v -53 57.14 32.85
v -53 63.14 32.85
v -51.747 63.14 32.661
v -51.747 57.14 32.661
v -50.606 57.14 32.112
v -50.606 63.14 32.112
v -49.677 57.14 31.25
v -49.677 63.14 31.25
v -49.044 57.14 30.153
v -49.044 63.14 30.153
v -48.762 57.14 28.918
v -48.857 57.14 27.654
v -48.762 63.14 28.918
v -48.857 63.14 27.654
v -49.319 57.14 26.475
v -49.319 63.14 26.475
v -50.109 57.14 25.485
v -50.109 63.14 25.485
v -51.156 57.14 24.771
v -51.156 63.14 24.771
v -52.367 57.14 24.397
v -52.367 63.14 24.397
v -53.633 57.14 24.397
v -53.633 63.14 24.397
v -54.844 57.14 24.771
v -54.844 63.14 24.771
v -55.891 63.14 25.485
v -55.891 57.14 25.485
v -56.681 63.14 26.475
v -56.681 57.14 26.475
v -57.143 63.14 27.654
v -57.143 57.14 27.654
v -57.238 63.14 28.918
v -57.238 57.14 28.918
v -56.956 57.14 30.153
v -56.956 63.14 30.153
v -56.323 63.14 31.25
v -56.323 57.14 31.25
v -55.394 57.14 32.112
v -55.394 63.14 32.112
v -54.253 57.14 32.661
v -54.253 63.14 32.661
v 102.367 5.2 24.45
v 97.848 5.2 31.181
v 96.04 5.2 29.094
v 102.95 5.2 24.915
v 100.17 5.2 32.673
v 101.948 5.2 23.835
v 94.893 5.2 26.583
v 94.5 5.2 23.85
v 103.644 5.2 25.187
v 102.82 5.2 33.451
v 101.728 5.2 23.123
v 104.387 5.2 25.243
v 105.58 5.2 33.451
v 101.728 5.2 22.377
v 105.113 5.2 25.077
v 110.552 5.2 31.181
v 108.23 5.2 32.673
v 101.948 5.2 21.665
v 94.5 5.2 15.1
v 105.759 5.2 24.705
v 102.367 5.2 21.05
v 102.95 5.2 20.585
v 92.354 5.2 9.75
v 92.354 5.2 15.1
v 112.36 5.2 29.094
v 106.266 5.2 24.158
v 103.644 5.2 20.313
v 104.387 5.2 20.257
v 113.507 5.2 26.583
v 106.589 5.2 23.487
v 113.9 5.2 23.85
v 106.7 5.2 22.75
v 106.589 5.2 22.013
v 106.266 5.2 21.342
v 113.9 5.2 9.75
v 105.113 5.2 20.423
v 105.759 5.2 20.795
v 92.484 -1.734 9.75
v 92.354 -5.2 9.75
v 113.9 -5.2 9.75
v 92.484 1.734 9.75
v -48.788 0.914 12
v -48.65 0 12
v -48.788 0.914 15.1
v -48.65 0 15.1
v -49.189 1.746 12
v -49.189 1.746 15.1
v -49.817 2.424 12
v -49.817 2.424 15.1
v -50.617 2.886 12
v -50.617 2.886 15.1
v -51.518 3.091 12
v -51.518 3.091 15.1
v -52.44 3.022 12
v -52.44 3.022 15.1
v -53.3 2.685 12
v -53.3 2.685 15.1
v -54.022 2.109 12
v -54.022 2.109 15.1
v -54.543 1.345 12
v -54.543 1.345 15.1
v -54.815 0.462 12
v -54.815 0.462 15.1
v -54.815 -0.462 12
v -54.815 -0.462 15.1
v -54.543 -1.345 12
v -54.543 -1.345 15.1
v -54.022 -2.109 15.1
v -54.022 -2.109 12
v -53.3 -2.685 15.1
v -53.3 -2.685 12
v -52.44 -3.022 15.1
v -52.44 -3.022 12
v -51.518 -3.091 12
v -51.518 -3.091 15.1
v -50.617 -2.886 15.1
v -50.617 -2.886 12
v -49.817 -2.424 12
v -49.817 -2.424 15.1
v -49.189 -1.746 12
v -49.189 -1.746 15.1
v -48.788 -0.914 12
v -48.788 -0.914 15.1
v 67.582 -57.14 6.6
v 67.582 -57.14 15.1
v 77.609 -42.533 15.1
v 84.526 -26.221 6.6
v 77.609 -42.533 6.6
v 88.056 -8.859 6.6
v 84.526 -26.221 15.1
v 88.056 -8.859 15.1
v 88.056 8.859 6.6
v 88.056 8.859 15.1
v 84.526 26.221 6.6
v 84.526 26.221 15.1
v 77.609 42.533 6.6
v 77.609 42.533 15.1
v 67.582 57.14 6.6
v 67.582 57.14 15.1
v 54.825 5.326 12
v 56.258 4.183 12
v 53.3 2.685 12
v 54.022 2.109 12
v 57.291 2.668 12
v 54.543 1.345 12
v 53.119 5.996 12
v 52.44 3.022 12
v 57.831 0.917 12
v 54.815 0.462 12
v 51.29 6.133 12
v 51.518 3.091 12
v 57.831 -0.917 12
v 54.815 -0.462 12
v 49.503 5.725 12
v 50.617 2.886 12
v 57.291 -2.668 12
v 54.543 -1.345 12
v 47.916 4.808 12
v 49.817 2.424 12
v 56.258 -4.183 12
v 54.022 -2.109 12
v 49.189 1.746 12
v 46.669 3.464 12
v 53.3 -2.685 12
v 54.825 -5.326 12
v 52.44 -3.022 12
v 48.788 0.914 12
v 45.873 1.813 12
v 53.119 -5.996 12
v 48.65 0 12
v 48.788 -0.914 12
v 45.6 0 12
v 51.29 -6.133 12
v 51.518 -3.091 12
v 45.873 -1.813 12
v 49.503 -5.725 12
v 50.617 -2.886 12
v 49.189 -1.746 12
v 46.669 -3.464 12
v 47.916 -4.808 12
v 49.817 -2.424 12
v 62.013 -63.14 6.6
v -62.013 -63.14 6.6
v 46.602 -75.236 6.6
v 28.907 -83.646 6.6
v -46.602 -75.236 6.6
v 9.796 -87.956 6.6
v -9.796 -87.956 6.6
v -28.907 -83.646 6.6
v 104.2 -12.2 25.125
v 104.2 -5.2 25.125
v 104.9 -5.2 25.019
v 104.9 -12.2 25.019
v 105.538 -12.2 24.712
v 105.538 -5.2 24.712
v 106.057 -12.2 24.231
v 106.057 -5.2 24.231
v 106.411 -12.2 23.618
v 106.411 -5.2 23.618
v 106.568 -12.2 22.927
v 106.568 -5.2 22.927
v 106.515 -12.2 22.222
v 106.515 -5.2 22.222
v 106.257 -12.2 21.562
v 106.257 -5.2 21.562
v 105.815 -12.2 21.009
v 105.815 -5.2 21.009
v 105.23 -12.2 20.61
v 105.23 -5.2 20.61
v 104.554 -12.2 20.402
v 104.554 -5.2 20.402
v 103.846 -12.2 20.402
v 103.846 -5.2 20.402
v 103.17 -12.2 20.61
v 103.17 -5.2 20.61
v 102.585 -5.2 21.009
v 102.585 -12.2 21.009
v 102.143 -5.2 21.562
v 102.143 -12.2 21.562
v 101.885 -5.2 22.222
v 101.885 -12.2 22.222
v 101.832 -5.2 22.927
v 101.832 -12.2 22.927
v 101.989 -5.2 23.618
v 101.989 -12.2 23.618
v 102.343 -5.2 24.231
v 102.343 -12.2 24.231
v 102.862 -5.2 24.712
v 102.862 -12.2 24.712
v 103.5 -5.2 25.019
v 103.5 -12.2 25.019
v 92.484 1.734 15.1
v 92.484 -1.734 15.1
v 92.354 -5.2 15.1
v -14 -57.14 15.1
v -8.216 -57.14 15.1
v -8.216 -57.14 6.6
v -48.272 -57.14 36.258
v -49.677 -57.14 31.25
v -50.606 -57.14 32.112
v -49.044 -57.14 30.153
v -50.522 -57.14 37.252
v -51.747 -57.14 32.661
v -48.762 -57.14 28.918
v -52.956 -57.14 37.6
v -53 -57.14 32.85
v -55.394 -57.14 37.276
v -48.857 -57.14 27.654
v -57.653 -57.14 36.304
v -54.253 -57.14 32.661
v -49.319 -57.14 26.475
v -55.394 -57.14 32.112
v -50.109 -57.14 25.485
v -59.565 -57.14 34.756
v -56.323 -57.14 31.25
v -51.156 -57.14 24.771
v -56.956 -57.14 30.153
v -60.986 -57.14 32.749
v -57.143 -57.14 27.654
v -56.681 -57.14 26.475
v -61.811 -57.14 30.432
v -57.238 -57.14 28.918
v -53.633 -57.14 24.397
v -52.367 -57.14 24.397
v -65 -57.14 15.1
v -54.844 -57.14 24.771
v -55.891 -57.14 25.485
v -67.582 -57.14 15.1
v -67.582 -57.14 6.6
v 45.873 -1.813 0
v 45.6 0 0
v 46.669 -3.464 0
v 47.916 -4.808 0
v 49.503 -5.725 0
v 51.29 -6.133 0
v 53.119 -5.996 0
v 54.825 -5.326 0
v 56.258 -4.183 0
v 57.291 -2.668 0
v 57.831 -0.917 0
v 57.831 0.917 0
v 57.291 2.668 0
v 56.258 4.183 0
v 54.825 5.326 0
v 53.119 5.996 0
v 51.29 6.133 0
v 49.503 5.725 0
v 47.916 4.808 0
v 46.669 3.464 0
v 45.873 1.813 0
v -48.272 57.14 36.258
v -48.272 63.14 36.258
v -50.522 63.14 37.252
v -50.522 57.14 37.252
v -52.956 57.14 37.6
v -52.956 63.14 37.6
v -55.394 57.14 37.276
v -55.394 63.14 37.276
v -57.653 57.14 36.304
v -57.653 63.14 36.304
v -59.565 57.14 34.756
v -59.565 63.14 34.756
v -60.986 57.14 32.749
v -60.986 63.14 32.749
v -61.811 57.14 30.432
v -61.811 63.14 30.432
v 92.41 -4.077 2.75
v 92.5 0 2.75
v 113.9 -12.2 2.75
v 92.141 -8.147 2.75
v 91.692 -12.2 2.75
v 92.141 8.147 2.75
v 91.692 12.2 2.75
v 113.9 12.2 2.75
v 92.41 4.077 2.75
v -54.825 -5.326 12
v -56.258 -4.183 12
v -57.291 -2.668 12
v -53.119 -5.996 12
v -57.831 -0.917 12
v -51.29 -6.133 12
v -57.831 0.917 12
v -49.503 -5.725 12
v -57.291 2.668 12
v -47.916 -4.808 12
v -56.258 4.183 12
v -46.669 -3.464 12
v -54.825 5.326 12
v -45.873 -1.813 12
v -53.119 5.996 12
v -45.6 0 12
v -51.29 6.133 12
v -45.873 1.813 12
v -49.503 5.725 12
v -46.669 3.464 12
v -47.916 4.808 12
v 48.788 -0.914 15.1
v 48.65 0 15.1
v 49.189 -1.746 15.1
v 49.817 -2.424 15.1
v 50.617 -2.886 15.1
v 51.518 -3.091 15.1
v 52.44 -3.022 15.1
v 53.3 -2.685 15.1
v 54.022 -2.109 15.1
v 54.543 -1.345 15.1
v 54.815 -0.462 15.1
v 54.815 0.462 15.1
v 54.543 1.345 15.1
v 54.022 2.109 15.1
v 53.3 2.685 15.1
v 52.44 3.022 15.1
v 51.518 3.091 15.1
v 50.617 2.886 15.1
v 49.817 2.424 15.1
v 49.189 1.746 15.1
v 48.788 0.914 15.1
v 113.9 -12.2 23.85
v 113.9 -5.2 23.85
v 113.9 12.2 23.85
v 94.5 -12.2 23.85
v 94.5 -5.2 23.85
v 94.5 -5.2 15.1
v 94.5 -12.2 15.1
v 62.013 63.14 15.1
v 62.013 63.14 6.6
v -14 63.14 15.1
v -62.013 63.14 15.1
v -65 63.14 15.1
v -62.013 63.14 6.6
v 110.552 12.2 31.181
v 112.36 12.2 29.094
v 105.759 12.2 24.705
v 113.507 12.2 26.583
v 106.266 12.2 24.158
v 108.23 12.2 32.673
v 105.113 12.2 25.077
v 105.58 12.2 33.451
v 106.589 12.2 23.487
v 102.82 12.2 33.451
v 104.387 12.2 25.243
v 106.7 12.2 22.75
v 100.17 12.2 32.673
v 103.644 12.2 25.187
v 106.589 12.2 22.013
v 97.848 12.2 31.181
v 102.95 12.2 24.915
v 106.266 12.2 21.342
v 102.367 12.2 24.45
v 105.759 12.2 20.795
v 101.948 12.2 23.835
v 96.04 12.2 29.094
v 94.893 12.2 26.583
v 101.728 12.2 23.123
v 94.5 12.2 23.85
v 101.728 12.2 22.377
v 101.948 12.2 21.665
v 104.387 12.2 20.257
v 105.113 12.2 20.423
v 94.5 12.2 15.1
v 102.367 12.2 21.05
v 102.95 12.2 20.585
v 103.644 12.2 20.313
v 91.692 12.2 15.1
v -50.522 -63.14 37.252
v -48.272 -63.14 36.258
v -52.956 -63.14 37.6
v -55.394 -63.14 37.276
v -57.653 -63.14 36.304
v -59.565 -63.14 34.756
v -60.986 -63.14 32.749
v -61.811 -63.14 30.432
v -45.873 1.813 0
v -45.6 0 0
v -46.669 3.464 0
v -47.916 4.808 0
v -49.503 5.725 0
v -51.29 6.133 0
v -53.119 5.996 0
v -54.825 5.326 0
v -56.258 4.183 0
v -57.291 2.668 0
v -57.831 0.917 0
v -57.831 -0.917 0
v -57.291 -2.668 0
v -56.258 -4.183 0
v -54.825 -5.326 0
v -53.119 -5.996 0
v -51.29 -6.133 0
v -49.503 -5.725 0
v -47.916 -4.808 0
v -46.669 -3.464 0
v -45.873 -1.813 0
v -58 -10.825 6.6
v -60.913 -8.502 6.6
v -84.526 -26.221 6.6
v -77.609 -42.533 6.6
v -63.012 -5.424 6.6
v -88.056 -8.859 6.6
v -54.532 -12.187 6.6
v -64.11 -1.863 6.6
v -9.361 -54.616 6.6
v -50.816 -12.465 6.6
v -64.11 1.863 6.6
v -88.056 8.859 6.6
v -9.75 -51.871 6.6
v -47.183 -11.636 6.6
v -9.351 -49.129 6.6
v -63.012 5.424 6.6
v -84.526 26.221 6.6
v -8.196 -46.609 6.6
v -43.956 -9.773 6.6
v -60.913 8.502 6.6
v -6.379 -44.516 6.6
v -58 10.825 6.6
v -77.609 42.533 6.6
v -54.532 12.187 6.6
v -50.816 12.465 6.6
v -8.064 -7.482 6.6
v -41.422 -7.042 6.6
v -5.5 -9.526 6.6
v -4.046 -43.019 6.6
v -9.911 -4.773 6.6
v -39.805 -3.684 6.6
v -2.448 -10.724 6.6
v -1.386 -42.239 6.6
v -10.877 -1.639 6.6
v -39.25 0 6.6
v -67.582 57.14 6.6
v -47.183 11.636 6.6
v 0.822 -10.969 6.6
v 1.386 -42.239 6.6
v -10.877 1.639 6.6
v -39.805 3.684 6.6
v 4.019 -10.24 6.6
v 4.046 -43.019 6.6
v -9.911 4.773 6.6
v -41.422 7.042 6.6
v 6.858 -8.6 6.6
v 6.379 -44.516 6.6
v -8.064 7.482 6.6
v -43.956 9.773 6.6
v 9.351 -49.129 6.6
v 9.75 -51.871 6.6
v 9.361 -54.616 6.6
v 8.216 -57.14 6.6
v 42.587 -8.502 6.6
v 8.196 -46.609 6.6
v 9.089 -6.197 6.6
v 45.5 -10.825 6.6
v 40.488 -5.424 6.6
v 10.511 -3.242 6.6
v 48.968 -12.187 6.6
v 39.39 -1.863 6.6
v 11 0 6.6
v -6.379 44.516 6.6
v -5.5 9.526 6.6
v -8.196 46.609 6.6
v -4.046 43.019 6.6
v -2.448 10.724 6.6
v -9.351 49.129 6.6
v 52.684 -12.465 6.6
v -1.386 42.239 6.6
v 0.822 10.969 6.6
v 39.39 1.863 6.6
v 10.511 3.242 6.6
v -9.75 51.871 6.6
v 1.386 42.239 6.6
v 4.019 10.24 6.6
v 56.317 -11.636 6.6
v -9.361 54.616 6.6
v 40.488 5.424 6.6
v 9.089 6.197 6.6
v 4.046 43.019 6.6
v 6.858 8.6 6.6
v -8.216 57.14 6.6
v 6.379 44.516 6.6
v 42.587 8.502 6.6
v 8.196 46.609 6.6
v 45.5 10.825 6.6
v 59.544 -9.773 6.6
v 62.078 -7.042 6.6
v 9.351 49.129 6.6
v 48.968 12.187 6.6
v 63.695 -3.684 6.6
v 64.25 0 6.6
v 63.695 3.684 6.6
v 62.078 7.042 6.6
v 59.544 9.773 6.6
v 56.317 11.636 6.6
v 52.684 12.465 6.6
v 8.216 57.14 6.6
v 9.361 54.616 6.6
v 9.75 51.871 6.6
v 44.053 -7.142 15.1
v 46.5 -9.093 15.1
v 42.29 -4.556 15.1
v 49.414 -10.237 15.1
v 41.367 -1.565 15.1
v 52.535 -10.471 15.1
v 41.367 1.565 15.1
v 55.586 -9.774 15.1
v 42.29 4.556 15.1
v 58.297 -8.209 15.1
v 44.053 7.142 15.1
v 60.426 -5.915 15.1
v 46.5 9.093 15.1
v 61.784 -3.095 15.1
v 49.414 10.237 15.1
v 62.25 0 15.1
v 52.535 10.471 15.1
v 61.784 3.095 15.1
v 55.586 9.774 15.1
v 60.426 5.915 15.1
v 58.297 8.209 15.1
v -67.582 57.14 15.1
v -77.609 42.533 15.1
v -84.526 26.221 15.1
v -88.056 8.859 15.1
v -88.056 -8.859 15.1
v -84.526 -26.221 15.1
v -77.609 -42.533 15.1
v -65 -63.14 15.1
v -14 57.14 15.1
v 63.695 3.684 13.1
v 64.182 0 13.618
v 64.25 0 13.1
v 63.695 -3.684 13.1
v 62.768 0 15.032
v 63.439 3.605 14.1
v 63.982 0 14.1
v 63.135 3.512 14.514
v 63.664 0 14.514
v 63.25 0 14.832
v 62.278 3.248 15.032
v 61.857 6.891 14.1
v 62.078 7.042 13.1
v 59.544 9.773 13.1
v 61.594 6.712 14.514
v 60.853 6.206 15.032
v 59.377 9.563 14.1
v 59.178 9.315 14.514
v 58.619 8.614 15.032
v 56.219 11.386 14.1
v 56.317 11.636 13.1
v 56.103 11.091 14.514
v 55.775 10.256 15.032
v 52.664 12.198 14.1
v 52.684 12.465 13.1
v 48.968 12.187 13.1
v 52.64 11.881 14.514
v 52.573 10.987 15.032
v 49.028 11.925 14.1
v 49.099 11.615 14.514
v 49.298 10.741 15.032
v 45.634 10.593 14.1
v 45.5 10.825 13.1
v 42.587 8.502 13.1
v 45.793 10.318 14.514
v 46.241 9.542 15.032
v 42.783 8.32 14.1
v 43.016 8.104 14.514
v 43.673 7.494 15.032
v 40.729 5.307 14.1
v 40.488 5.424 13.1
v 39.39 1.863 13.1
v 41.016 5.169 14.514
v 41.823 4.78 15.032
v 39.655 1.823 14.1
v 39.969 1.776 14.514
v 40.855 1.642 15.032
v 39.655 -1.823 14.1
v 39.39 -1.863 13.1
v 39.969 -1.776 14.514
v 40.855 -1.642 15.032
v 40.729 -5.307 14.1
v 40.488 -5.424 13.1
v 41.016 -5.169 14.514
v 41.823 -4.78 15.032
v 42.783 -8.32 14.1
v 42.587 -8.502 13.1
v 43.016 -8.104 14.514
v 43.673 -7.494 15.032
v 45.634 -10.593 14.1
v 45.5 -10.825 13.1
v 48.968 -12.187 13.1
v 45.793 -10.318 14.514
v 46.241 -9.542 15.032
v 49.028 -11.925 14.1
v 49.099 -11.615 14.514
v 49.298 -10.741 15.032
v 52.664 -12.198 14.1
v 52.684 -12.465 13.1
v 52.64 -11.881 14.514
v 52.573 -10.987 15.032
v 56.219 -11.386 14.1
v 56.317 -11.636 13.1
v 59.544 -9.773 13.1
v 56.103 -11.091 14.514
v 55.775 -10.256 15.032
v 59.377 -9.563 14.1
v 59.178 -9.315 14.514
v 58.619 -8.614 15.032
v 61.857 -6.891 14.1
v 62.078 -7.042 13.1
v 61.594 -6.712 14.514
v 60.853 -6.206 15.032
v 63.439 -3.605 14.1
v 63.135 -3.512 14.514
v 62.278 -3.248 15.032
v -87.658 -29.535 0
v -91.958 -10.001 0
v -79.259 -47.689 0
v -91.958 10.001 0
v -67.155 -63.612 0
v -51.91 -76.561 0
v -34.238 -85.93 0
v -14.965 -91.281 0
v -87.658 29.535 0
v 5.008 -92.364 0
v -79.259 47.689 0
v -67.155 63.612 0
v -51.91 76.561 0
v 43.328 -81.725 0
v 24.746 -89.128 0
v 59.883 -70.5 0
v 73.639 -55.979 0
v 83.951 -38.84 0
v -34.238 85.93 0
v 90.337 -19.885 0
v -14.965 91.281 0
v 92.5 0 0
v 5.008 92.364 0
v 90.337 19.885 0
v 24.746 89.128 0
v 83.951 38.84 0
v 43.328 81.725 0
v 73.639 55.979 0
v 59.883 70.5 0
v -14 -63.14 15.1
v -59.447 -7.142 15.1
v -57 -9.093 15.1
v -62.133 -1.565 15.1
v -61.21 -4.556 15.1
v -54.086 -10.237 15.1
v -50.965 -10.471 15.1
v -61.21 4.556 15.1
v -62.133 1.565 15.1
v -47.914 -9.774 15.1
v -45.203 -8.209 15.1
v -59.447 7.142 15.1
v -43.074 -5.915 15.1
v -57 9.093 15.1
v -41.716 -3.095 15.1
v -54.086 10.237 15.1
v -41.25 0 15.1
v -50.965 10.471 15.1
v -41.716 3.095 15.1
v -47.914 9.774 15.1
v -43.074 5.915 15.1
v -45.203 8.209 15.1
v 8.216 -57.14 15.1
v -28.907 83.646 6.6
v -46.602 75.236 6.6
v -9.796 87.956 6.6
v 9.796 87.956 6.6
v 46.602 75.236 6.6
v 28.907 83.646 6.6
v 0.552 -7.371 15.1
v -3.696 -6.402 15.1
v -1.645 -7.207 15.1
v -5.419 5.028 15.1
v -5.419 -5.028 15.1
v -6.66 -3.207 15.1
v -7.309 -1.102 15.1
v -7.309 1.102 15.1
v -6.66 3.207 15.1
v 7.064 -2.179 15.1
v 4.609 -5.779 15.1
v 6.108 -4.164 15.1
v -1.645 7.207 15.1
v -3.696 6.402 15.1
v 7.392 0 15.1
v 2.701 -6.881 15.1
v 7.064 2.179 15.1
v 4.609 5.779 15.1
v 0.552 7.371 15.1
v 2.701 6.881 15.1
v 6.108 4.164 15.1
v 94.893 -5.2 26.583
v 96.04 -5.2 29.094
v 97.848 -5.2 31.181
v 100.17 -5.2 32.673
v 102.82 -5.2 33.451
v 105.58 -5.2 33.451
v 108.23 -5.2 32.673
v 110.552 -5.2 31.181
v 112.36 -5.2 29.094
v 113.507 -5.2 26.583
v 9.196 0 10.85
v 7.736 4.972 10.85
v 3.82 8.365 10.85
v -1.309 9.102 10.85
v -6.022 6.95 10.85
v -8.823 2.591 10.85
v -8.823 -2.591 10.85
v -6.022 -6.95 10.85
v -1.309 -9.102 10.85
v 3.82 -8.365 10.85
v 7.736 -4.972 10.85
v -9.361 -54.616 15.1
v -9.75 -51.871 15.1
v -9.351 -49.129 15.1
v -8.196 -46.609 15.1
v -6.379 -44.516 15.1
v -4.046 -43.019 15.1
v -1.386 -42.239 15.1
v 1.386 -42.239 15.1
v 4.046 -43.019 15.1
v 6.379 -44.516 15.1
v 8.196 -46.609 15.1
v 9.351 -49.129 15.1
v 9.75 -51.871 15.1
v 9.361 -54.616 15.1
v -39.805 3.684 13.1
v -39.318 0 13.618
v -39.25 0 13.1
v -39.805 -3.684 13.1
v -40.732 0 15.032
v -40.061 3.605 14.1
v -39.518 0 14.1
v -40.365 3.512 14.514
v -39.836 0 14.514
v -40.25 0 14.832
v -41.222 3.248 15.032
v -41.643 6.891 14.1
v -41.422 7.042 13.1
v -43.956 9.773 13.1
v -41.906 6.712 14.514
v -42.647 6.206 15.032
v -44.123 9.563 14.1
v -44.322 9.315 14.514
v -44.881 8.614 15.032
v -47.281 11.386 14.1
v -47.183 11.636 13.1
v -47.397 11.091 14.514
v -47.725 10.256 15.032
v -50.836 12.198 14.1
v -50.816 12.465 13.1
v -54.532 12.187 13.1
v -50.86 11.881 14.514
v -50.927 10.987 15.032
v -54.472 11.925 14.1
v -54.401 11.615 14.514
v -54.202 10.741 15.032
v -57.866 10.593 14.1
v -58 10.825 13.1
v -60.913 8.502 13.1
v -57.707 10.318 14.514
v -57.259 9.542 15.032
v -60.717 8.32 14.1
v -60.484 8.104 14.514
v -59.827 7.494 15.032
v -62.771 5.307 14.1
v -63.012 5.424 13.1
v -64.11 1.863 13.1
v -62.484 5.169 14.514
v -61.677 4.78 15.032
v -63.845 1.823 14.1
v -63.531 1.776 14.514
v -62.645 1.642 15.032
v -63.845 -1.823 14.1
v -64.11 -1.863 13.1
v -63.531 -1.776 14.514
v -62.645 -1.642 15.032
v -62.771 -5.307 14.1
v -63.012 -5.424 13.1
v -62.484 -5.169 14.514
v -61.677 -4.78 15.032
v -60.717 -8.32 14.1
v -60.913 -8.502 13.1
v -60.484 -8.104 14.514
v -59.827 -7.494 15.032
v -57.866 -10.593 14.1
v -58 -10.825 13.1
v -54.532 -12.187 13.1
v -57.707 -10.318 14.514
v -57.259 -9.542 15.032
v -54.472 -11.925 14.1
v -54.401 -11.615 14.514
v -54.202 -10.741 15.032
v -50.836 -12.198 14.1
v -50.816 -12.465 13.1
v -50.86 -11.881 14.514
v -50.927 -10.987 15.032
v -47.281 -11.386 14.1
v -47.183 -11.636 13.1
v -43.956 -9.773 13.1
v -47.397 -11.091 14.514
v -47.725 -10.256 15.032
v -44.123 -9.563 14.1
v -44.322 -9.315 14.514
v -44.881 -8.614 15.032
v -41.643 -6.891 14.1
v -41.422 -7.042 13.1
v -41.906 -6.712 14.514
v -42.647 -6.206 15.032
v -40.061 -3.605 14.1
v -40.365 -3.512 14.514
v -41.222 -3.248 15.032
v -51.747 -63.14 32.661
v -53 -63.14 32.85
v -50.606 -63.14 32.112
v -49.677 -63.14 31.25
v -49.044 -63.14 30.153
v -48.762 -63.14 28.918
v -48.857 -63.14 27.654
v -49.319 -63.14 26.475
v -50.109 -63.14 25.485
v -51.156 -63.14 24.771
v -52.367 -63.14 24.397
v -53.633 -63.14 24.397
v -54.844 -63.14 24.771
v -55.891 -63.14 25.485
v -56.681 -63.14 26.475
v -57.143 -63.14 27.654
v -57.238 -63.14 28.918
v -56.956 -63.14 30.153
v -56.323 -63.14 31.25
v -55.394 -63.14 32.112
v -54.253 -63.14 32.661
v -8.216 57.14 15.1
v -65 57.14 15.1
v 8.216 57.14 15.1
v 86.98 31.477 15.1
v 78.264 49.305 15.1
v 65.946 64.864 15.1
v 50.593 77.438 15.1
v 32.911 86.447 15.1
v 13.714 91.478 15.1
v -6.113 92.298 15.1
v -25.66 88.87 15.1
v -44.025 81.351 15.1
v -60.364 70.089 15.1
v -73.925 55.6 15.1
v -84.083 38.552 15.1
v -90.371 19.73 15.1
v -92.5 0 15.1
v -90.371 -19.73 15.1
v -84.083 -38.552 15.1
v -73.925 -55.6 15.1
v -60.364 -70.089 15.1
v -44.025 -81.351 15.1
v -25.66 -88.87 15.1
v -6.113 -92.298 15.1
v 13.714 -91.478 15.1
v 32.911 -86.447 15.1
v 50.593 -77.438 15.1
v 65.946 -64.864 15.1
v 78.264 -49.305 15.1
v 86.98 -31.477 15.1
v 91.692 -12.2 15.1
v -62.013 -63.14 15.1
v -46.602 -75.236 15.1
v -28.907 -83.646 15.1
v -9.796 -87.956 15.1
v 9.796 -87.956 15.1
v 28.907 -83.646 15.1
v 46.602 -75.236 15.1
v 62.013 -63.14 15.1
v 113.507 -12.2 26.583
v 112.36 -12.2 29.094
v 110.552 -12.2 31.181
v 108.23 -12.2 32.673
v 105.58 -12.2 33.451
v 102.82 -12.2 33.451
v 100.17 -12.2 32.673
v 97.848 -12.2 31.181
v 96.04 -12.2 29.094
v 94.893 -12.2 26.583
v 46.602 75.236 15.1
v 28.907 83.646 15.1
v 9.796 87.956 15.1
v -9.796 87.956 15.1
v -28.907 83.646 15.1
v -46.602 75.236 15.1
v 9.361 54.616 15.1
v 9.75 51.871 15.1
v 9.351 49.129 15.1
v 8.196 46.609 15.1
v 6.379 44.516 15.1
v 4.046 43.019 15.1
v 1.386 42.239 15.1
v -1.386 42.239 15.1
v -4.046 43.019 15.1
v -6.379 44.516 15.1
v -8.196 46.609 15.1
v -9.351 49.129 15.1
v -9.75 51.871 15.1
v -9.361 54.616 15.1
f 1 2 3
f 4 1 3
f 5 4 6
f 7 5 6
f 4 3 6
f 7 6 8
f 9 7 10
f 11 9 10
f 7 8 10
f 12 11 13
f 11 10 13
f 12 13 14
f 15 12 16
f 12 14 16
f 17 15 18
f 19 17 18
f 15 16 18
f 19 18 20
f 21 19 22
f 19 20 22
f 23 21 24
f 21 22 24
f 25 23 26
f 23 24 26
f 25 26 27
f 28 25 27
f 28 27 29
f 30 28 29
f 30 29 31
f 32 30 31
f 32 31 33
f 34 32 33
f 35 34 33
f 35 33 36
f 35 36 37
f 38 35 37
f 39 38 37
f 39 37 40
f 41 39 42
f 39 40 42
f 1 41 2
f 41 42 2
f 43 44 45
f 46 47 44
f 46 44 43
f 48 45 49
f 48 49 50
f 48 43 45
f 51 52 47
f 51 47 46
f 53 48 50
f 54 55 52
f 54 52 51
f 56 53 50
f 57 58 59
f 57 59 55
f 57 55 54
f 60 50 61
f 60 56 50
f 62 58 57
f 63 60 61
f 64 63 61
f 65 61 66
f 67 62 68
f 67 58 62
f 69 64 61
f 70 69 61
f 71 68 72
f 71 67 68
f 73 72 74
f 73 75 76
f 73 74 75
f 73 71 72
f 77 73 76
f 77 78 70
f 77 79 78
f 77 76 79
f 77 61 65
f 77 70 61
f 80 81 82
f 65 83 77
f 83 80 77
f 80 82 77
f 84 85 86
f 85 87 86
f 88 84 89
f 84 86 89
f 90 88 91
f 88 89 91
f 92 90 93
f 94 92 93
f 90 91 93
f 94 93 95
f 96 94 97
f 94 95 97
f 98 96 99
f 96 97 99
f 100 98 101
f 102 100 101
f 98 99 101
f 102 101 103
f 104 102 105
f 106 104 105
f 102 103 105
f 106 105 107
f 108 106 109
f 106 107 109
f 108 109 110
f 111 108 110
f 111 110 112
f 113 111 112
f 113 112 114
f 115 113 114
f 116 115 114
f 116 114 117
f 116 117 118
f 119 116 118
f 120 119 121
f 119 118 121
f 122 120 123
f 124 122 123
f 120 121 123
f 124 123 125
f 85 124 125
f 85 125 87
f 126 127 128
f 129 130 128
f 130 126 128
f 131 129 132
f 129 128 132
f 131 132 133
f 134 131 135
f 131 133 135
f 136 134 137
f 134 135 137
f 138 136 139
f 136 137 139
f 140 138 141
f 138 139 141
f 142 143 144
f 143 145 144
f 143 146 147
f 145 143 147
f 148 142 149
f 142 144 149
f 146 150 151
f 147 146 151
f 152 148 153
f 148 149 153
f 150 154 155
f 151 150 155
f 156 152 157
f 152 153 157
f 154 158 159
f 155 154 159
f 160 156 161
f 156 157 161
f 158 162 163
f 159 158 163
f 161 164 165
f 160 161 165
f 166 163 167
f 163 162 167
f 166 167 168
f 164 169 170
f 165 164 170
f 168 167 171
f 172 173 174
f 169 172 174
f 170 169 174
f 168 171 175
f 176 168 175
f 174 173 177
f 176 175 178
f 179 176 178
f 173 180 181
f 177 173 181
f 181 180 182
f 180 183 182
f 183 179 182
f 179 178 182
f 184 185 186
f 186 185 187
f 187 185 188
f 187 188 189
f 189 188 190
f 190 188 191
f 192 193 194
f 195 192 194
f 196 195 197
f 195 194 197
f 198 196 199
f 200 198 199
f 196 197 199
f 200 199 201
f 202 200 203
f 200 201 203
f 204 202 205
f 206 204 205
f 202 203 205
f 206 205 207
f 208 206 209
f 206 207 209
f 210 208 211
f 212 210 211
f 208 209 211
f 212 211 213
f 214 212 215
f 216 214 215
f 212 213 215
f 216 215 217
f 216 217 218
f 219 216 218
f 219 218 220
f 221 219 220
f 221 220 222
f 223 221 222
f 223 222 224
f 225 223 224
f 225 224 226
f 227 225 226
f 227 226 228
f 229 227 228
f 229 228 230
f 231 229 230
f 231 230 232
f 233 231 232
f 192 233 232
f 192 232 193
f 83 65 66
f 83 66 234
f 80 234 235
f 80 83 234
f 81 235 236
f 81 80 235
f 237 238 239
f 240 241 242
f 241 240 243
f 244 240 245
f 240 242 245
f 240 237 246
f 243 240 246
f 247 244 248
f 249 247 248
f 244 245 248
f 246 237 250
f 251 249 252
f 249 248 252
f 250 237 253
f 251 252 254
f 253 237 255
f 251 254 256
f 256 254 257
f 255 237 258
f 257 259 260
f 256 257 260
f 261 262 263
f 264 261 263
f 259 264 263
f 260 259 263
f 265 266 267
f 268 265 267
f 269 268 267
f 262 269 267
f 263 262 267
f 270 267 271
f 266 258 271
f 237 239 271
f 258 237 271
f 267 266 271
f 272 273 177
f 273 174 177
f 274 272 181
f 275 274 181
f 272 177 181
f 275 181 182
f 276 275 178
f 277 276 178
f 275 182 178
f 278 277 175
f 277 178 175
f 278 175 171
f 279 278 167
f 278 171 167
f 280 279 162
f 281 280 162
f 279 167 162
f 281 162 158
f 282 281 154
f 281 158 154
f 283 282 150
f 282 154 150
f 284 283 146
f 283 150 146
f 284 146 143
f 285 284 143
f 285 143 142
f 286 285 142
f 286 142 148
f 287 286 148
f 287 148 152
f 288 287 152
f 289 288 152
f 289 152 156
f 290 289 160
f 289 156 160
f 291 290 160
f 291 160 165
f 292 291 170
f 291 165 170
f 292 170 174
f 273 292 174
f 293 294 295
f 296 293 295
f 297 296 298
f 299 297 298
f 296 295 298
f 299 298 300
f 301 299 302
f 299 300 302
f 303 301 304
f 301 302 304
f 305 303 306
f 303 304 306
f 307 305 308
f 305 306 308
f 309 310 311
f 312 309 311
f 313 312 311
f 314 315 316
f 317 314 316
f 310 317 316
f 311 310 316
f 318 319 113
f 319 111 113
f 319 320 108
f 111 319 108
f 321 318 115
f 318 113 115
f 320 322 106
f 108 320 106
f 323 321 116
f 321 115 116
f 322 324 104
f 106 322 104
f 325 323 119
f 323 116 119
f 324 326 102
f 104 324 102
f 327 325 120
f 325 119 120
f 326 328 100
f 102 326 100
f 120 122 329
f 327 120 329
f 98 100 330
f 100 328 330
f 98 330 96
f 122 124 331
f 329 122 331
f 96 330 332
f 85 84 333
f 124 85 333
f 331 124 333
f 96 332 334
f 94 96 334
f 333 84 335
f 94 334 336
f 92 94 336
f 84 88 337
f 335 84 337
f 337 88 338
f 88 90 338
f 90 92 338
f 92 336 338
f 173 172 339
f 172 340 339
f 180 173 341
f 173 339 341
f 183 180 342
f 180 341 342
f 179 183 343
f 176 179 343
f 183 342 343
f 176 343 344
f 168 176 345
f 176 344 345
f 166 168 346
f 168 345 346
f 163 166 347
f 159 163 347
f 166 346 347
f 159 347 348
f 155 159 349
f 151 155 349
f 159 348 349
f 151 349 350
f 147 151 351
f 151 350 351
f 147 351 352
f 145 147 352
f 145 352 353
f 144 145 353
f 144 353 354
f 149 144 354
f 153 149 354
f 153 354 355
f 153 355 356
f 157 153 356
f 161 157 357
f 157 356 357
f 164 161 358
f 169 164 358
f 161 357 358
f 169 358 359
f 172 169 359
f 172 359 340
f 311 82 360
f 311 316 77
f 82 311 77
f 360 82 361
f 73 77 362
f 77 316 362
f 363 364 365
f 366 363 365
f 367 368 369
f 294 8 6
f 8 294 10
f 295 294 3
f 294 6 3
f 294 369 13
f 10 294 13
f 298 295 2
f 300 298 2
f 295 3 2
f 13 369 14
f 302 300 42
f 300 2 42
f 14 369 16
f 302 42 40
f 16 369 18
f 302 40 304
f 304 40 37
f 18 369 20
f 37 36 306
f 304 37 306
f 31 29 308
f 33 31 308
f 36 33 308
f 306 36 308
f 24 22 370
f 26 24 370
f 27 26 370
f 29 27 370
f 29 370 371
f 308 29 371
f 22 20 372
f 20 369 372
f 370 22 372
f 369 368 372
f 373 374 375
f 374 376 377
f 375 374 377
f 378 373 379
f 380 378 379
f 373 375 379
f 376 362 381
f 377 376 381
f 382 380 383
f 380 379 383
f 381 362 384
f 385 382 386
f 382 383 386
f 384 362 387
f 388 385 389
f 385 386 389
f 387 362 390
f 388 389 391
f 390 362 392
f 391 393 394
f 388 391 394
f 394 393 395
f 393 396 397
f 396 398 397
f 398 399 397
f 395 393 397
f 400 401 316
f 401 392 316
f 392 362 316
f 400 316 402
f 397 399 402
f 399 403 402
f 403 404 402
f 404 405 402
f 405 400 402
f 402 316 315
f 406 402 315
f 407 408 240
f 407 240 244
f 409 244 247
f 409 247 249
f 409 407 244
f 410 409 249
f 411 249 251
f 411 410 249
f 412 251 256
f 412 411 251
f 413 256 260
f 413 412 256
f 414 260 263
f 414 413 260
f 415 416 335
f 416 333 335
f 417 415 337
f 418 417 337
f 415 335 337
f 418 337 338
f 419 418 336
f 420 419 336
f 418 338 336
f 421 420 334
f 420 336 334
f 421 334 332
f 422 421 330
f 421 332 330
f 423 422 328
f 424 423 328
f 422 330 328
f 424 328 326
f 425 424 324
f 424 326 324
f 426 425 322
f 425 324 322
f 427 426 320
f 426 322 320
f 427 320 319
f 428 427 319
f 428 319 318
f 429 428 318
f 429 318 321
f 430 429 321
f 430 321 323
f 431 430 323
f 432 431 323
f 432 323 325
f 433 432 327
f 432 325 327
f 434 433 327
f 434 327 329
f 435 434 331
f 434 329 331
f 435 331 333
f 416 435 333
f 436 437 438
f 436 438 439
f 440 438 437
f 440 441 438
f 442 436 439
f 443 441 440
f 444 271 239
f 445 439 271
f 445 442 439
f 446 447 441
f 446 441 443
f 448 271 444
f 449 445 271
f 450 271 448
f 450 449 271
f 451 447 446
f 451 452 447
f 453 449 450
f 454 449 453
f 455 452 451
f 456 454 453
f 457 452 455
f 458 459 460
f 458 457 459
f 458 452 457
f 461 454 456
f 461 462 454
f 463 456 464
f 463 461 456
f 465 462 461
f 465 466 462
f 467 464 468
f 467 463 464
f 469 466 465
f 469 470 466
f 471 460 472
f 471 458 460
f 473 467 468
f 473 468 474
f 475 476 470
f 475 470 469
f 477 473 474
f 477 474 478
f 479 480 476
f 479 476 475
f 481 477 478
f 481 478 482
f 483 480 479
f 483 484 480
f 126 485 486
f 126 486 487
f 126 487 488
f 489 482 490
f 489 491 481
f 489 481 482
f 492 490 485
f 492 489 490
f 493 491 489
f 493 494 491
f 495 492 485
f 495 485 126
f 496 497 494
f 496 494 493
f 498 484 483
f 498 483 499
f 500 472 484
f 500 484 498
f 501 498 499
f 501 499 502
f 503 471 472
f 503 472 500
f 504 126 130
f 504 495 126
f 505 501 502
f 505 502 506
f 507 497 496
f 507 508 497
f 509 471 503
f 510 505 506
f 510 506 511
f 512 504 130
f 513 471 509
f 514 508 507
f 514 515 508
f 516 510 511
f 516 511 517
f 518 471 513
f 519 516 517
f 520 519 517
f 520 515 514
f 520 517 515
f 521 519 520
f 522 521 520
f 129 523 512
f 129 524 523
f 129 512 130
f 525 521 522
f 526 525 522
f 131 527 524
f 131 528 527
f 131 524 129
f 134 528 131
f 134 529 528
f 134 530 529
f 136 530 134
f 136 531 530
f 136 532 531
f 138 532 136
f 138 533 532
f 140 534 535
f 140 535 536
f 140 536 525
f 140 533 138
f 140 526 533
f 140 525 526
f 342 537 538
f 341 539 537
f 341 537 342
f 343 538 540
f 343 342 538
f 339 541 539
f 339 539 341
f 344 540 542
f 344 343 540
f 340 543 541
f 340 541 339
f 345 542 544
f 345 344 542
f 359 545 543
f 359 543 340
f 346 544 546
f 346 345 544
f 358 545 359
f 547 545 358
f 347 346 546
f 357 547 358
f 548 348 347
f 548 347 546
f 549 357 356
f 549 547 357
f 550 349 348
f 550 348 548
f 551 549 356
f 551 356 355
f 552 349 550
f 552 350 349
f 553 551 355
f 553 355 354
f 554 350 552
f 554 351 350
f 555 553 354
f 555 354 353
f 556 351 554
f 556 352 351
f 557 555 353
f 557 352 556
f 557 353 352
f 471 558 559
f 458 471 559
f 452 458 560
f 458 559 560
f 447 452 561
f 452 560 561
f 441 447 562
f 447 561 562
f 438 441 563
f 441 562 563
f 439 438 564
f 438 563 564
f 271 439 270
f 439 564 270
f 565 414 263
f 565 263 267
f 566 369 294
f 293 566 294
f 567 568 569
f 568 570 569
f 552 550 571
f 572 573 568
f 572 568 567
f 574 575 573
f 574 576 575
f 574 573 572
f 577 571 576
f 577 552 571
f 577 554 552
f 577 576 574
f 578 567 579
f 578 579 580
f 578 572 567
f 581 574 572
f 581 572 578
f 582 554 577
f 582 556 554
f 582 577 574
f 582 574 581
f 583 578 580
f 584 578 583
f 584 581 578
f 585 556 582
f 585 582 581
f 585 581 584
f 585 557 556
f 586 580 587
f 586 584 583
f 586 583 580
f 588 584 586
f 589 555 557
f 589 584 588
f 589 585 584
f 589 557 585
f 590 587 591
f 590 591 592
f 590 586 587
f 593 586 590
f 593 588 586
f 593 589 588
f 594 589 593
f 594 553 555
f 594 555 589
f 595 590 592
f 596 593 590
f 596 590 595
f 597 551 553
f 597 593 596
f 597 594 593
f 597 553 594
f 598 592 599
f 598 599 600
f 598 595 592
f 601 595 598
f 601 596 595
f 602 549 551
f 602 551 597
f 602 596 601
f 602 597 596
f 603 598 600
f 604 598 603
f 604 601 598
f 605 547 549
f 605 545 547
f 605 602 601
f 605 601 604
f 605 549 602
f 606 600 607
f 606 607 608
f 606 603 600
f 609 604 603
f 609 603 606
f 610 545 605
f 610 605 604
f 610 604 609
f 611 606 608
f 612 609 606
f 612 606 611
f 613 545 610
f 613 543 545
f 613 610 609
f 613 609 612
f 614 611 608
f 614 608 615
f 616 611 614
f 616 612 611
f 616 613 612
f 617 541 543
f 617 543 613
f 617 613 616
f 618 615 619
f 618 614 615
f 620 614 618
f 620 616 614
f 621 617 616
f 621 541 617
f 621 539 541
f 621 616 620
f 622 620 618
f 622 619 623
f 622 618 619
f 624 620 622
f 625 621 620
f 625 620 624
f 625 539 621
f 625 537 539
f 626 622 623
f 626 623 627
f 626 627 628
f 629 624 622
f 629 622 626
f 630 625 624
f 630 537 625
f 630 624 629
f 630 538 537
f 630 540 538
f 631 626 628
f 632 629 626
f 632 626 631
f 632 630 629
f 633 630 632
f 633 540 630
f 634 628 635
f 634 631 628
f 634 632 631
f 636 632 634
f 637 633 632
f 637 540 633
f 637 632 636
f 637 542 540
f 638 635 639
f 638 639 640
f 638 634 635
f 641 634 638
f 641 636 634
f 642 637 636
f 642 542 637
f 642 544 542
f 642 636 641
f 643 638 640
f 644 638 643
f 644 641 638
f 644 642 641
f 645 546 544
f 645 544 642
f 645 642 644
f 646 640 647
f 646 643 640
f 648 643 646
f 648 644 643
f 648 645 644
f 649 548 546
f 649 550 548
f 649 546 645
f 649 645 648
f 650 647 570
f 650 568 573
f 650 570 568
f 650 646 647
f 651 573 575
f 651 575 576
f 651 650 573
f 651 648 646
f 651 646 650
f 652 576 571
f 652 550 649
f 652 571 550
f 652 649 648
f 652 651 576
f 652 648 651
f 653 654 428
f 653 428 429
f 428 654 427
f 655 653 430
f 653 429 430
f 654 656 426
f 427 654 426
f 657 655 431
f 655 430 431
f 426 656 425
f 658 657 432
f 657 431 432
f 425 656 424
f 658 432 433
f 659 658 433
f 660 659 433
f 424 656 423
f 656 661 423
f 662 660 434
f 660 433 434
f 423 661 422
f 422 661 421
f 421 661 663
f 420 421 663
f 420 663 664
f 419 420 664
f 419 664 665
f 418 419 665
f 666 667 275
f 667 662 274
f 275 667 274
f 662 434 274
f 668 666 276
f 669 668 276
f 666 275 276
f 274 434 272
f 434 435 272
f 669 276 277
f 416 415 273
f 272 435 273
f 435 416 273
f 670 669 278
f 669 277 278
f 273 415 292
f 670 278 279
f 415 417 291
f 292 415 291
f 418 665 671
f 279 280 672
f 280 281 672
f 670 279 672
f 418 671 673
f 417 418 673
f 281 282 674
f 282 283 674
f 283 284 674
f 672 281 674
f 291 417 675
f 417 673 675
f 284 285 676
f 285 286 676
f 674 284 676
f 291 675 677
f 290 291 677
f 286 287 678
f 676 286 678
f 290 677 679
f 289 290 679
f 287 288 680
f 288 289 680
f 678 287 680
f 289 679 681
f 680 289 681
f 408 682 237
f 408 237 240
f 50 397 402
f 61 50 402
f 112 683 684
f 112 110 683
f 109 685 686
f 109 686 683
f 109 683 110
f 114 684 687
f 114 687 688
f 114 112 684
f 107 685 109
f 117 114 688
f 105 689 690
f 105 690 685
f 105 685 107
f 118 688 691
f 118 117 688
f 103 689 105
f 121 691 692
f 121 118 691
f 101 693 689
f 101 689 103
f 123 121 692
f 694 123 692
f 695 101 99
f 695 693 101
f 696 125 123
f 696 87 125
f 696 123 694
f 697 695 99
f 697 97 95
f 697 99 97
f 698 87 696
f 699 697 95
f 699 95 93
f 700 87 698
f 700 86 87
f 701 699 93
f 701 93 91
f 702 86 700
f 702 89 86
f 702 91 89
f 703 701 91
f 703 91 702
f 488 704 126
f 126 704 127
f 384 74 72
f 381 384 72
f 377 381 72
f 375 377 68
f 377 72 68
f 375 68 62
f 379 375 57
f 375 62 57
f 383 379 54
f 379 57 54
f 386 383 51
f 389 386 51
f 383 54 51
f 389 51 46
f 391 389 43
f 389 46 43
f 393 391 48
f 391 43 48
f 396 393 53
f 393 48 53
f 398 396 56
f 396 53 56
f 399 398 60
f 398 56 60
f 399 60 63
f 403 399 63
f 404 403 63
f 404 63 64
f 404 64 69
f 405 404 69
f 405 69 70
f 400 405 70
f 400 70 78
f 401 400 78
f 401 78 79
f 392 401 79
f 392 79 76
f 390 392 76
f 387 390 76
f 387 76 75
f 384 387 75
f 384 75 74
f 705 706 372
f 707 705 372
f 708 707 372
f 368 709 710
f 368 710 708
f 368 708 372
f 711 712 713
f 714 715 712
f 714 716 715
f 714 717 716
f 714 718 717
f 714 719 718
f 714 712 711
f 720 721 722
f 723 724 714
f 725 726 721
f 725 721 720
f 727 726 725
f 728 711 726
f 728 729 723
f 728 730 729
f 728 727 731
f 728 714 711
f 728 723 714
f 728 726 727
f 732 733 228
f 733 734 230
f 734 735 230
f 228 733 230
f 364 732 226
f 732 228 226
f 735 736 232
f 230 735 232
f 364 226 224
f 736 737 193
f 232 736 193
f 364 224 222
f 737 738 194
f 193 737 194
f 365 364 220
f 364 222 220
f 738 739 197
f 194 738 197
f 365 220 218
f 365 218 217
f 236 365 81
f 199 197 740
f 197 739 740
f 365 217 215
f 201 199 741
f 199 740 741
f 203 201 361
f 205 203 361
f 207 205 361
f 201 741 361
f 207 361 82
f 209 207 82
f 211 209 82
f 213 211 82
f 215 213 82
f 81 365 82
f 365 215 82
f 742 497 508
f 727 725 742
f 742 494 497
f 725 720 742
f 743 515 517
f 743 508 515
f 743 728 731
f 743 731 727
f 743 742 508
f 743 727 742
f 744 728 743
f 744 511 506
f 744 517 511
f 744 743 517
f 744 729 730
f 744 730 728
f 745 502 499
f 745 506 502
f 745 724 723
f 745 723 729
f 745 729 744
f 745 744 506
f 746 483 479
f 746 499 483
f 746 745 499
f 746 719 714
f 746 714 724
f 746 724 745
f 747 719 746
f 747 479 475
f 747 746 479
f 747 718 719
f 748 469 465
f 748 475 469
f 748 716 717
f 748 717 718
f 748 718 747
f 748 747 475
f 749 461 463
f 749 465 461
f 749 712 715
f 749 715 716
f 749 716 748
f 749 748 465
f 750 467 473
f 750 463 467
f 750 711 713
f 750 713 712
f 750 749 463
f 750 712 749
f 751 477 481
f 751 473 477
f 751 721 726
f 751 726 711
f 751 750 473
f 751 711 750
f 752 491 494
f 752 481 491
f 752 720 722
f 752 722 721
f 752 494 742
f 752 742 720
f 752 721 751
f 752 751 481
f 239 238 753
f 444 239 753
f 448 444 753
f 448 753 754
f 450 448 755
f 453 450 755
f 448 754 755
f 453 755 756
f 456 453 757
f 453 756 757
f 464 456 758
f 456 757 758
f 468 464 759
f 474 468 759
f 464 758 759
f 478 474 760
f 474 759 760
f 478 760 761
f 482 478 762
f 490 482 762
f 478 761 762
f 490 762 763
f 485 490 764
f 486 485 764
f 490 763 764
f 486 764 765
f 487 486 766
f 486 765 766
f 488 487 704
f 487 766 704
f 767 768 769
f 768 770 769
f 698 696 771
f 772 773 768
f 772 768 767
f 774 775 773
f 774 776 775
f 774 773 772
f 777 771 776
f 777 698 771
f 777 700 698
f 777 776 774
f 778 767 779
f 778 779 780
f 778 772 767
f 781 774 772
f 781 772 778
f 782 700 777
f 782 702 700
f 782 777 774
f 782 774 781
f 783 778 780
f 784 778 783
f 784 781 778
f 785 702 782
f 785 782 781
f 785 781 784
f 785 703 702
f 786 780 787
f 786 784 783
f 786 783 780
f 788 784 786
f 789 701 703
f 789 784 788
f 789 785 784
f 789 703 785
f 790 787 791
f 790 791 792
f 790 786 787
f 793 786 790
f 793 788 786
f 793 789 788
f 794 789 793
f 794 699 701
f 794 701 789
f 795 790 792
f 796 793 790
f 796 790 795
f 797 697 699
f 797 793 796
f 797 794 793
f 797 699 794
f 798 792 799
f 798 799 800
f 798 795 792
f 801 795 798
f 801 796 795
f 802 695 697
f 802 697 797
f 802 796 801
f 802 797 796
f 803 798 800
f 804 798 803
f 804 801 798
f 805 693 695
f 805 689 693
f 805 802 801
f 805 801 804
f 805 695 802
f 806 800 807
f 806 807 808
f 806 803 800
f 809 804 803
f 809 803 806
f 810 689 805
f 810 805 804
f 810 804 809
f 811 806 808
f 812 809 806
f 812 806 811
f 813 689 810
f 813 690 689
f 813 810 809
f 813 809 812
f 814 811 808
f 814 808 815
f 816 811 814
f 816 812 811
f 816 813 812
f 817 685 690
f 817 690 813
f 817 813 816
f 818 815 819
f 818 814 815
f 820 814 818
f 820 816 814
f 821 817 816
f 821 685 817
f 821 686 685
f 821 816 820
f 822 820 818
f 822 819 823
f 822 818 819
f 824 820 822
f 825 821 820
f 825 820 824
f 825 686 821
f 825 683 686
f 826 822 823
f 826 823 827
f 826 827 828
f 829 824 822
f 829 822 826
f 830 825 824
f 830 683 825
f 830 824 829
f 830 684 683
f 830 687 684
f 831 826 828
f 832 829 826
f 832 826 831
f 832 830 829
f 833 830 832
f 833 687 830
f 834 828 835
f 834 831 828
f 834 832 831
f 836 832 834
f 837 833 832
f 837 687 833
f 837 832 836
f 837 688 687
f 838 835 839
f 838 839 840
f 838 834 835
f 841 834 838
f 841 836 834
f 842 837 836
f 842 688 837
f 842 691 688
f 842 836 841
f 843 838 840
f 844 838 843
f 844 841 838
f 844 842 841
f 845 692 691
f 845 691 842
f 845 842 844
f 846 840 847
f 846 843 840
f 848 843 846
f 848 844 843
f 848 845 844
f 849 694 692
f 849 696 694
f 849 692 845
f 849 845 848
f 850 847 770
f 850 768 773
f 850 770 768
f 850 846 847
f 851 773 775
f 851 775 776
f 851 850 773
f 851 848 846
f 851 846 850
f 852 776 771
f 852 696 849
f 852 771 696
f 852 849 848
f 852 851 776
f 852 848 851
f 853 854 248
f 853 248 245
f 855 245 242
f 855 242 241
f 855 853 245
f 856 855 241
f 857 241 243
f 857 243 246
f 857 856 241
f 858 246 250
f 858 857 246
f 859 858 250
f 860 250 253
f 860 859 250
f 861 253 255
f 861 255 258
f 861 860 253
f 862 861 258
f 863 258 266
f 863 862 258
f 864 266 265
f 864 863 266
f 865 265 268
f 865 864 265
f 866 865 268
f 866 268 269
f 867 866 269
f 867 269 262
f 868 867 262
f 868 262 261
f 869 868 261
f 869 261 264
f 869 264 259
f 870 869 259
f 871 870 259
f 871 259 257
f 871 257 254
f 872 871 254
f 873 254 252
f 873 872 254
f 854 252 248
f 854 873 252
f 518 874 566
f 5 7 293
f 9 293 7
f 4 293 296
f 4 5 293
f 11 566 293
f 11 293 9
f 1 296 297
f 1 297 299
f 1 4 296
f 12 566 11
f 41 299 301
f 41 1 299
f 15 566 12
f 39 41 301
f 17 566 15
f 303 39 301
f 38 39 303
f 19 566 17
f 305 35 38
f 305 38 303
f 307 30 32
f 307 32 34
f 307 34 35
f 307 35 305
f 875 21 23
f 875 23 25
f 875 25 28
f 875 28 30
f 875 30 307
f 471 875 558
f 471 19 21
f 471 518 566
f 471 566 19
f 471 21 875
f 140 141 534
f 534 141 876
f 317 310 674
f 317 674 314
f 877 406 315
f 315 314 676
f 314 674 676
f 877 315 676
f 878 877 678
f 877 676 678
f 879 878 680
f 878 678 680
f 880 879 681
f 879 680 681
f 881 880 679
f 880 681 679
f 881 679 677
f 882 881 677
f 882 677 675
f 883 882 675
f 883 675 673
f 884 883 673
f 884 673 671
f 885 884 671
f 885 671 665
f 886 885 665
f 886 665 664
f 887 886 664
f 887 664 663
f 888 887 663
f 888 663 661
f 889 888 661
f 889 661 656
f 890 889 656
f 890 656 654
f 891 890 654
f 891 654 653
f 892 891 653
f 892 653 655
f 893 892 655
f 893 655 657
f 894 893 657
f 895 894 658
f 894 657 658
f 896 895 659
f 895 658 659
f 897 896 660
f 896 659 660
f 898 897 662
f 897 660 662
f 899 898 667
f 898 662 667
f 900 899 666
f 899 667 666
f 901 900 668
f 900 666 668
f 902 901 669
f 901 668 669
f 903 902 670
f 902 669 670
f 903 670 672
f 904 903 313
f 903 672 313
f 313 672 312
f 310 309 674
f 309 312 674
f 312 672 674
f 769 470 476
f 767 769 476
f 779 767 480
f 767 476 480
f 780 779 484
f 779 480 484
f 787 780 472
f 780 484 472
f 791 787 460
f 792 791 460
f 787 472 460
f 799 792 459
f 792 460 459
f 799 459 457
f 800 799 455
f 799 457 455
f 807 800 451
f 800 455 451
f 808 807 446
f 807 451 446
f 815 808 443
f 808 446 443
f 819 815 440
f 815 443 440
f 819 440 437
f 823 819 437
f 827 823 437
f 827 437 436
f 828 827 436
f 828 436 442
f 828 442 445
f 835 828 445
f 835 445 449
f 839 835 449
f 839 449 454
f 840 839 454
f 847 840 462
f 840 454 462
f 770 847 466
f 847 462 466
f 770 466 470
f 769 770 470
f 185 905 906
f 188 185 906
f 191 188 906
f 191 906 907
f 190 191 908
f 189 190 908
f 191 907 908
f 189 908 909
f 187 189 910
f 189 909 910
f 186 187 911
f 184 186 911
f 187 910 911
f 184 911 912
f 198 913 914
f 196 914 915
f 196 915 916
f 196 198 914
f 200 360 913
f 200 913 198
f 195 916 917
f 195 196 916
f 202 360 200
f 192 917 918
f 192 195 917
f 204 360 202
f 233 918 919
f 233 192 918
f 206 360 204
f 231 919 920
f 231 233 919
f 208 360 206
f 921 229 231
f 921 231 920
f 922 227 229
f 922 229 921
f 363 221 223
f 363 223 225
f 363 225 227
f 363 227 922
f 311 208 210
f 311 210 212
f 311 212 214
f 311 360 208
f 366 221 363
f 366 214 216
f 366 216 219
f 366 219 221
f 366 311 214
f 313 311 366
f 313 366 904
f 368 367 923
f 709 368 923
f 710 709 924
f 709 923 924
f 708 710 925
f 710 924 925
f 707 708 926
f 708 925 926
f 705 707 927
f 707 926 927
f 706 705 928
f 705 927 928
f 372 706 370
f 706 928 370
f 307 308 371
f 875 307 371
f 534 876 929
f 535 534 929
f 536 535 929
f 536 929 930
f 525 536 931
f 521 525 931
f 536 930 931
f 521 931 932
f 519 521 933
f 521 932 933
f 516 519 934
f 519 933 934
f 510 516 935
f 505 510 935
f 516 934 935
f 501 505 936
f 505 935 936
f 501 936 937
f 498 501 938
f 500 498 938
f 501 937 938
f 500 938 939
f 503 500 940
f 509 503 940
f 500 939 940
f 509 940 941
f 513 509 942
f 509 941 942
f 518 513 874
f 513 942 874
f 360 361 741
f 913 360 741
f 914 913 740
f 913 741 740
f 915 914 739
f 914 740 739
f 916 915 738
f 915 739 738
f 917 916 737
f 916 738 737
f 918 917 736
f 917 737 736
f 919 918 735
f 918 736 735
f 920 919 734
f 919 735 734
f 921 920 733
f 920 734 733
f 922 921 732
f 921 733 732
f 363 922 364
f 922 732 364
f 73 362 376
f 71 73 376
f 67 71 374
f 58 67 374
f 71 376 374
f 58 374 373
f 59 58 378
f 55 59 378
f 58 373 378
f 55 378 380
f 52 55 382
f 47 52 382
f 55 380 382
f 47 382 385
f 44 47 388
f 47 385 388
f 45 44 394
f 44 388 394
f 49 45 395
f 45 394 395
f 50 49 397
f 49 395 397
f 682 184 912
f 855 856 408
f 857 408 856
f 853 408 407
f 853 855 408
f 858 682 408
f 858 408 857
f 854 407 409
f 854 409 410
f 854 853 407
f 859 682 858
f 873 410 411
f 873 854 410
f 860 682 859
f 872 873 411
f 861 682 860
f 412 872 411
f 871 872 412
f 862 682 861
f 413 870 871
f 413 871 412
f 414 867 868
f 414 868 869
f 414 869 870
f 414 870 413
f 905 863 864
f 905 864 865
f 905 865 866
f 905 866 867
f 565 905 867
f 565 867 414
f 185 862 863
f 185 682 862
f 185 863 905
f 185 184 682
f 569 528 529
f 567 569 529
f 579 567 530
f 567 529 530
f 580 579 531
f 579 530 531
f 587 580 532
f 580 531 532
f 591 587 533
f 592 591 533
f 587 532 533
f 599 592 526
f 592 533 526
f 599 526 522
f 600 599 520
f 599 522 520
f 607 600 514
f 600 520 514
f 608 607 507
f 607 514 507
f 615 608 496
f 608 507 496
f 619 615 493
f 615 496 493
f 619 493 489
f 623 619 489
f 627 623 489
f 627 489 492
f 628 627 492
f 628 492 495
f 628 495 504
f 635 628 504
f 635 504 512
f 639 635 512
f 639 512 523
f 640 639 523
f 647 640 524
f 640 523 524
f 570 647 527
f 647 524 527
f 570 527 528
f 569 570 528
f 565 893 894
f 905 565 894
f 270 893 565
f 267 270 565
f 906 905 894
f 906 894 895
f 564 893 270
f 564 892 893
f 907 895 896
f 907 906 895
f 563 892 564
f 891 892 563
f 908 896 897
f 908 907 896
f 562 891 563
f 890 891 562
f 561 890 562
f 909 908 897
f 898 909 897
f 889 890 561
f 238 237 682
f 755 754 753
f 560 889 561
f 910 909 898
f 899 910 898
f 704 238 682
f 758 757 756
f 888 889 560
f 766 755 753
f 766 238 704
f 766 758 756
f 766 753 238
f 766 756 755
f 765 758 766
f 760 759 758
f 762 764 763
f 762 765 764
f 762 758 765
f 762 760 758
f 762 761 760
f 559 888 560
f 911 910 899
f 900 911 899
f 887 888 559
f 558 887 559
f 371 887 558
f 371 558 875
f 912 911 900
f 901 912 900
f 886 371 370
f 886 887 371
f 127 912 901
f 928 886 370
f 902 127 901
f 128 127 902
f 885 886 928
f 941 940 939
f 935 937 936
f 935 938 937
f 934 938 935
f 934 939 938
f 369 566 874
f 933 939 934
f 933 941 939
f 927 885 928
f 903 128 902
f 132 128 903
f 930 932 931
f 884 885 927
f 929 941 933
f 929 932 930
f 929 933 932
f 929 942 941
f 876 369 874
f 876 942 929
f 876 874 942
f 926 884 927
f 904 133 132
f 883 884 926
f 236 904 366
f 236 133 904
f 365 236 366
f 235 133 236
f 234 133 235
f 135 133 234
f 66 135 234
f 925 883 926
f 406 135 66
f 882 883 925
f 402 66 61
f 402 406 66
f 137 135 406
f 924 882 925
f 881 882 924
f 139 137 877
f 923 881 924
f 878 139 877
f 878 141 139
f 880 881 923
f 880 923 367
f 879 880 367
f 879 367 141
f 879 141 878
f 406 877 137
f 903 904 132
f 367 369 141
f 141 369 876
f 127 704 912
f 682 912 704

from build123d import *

# Parameters (mm, degrees)
ESQUISSE1_R                  = 92.5
BOSS_EXTRU_1_DEPTH           = 15.1
ESQUISSE2_R                  = 88.5
ENL_V_MAT_EXTRU_1_DEPTH      = 8.5
BOSS_EXTRU_2_DEPTH           = 8.5
ESQUISSE4_R                  = 11
BOSS_EXTRU_3_DEPTH           = 8.5
BOSS_EXTRU_3_TAPER           = 23
BOSS_EXTRU_4_DEPTH           = 12.2
ENL_V_MAT_EXTRU_2_REACH      = 230.654
ENL_V_MAT_EXTRU_2_END_RADIUS = 92.5
ESQUISSE6_W                  = 23.8
ESQUISSE6_H                  = 10.4
TROU_TARAUD_M61_D            = 5
TROU_TARAUD_M61_DEPTH        = 13
TROU_TARAUD_M61_TIP          = 1.502151548
ESQUISSE9_R                  = 2.375
ENL_V_MAT_EXTRU_3_DEPTH      = 154.76638937
ESQUISSE10_R                 = 4.25
BOSS_EXTRU_5_DEPTH           = 6
ESQUISSE11_R                 = 12.5
BOSS_EXTRU_6_DEPTH           = 8.5
CONG_1_R                     = 2
R_P_TITION_CIRCULAIRE1_COUNT = 2


with BuildPart() as part:
    # Esquisse1 → Boss.-Extru.1 (new body)
    with BuildSketch(Plane.XY):
        Circle(ESQUISSE1_R)
    extrude(amount=BOSS_EXTRU_1_DEPTH)

    # Esquisse2 → Enlèv. mat.-Extru.1 (cut)
    with BuildSketch(Plane.XY.offset(15.1)):
        Circle(ESQUISSE2_R)
    extrude(amount=-ENL_V_MAT_EXTRU_1_DEPTH, mode=Mode.SUBTRACT)

    # Esquisse3 → Boss.-Extru.2 (add)
    with BuildSketch(Plane.XY.offset(15.1)):
        with BuildLine():
            Line((-62.01282448, 63.14), (62.01282448, 63.14))
            ThreePointArc((62.01282448, 63.14), (64.86661415, 60.204421504), (67.58158329, 57.14))
            Line((67.58158329, 57.14), (8.215838363, 57.14))
            ThreePointArc((8.215838363, 57.14), (0, 42.14), (-8.215838363, 57.14))
            Line((-8.215838363, 57.14), (-67.58158329, 57.14))
            ThreePointArc((-67.58158329, 57.14), (-64.86661415, 60.204421504), (-62.01282448, 63.14))
        make_face()
        with BuildLine():
            Line((-67.58158329, -57.14), (-8.215838363, -57.14))
            ThreePointArc((-8.215838363, -57.14), (0, -42.14), (8.215838363, -57.14))
            Line((8.215838363, -57.14), (67.58158329, -57.14))
            ThreePointArc((67.58158329, -57.14), (64.86661415, -60.204421504), (62.01282448, -63.14))
            Line((62.01282448, -63.14), (-62.01282448, -63.14))
            ThreePointArc((-62.01282448, -63.14), (-64.86661415, -60.204421504), (-67.58158329, -57.14))
        make_face()
    extrude(amount=-BOSS_EXTRU_2_DEPTH)

    # Esquisse4 → Boss.-Extru.3 (add)
    with BuildSketch(Plane.XY.offset(6.6)):
        Circle(ESQUISSE4_R)
    extrude(amount=BOSS_EXTRU_3_DEPTH, taper=BOSS_EXTRU_3_TAPER)

    # Esquisse5 → Boss.-Extru.4 (add, symmetric)
    with BuildSketch(Plane(origin=(0, 0, 0), x_dir=(1, 0, 0), z_dir=(0, 1, 0))):
        with BuildLine():
            Line((90.5, -2.75), (113.9, -2.75))
            Line((113.9, -2.75), (113.9, -23.85))
            ThreePointArc((113.9, -23.85), (104.2, -33.55), (94.5, -23.85))
            Line((94.5, -23.85), (94.5, -15.1))
            Line((94.5, -15.1), (90.5, -15.1))
            Line((90.5, -15.1), (90.5, -2.75))
        make_face()
    extrude(amount=BOSS_EXTRU_4_DEPTH, both=True)

    # Enlèv. mat.-Extru.2: up to this cylinder (the profile starts outside it)
    enl_v_mat_extru_2_end = Plane(origin=(0, 0, 21.65), z_dir=(0, 0, -1)) * Cylinder(ENL_V_MAT_EXTRU_2_END_RADIUS, 647.308, mode=Mode.PRIVATE)
    # Esquisse6 → Enlèv. mat.-Extru.2 (cut, up to the surface)
    with BuildSketch(Plane(origin=(113.9, 0, 0), x_dir=(0, 0, -1), z_dir=(1, 0, 0)), mode=Mode.PRIVATE) as enl_v_mat_extru_2_sk1:
        with Locations((-21.65, 0)):
            Rectangle(ESQUISSE6_W, ESQUISSE6_H)
    enl_v_mat_extru_2_tool1 = extrude(enl_v_mat_extru_2_sk1.sketch, amount=-ENL_V_MAT_EXTRU_2_REACH, mode=Mode.PRIVATE) - enl_v_mat_extru_2_end
    add(enl_v_mat_extru_2_tool1.solids().sort_by_distance((113.9, 0, 21.65))[0], mode=Mode.SUBTRACT)

    # Trou taraudé M61
    with Locations(Plane(origin=(0, 12.2, 0), x_dir=(-1, 0, 0), z_dir=(0, 1, 0))):
        with Locations((-104.2, 22.75)):
            Hole(TROU_TARAUD_M61_D / 2, depth=TROU_TARAUD_M61_DEPTH)
            with Locations((0, 0, -(TROU_TARAUD_M61_DEPTH + TROU_TARAUD_M61_TIP / 2))):  # 118° drill point
                Cone(0, TROU_TARAUD_M61_D / 2, TROU_TARAUD_M61_TIP, mode=Mode.SUBTRACT)

    # Esquisse9 → Enlèv. mat.-Extru.3 (cut, through all)
    with BuildSketch(Plane(origin=(0, -5.2, 0), x_dir=(1, 0, 0), z_dir=(0, 1, 0))):
        with Locations(Location((104.2, -22.75, 0), (0, 0, 270))):
            Circle(ESQUISSE9_R)
    extrude(amount=-ENL_V_MAT_EXTRU_3_DEPTH, mode=Mode.SUBTRACT)

    # Esquisse10 → Boss.-Extru.5 (add)
    with BuildSketch(Plane(origin=(0, 63.14, 0), x_dir=(1, 0, 0), z_dir=(0, 1, 0))):
        with BuildLine():
            Line((-14, -15.1), (-48.272170546, -36.258173977))
            ThreePointArc((-48.272170546, -36.258173977), (-56.557229613, -36.867171069), (-61.811481567, -30.43242806))
            Line((-61.811481567, -30.43242806), (-65, -15.1))
            Line((-65, -15.1), (-14, -15.1))
        make_face()
        with Locations(Location((-53, -28.6, 0), (0, 0, 270))):
            Circle(ESQUISSE10_R, mode=Mode.SUBTRACT)
    boss_extru_5 = extrude(amount=-BOSS_EXTRU_5_DEPTH)

    # Symétrie1: Boss.-Extru.5 across plane
    add(boss_extru_5.mirror(Plane.ZX))

    # Esquisse11 → Boss.-Extru.6 (add)
    with BuildSketch(Plane.XY.offset(6.6)):
        with Locations((-51.75, 0)):
            Circle(ESQUISSE11_R)
        with Locations((51.75, 0)):
            Circle(ESQUISSE11_R)
    extrude(amount=BOSS_EXTRU_6_DEPTH)

    # Congé1
    cong_1_edges = [part.edges().sort_by_distance(p)[0] for p in [
        (-64.25, 0, 15.1),
        (39.25, 0, 15.1),
    ]]
    fillet(cong_1_edges, radius=CONG_1_R)

    # Esquisse12 → Enlèvement de matière-Révolution1 (revolve, cut)
    with BuildSketch(Plane(origin=(0, 0, 0), x_dir=(1, 0, 0), z_dir=(0, 1, 0)), mode=Mode.PRIVATE) as enl_vement_de_mati_re_r_volution1_sk:
        Polygon((57.9, 0), (57.9, -12), (54.85, -12), (54.85, -15.1), (51.75, -15.1), (51.75, 0), align=None)
    enl_vement_de_mati_re_r_volution1 = revolve(enl_vement_de_mati_re_r_volution1_sk.sketch.rotate(Axis((51.75, 0, -5.611731472), (0, 0, 1)), 180), axis=Axis((51.75, 0, -5.611731472), (0, 0, 1)), mode=Mode.SUBTRACT)

    # Répétition circulaire1: Enlèvement de matière-Révolution1 ×2 about axis
    r_p_tition_circulaire1_axis = Axis((0, 0, 0), (0, 0, 1))
    for i in range(1, R_P_TITION_CIRCULAIRE1_COUNT):
        add(enl_vement_de_mati_re_r_volution1.rotate(r_p_tition_circulaire1_axis, i * 360 / R_P_TITION_CIRCULAIRE1_COUNT), mode=Mode.SUBTRACT)


solid = part.part
